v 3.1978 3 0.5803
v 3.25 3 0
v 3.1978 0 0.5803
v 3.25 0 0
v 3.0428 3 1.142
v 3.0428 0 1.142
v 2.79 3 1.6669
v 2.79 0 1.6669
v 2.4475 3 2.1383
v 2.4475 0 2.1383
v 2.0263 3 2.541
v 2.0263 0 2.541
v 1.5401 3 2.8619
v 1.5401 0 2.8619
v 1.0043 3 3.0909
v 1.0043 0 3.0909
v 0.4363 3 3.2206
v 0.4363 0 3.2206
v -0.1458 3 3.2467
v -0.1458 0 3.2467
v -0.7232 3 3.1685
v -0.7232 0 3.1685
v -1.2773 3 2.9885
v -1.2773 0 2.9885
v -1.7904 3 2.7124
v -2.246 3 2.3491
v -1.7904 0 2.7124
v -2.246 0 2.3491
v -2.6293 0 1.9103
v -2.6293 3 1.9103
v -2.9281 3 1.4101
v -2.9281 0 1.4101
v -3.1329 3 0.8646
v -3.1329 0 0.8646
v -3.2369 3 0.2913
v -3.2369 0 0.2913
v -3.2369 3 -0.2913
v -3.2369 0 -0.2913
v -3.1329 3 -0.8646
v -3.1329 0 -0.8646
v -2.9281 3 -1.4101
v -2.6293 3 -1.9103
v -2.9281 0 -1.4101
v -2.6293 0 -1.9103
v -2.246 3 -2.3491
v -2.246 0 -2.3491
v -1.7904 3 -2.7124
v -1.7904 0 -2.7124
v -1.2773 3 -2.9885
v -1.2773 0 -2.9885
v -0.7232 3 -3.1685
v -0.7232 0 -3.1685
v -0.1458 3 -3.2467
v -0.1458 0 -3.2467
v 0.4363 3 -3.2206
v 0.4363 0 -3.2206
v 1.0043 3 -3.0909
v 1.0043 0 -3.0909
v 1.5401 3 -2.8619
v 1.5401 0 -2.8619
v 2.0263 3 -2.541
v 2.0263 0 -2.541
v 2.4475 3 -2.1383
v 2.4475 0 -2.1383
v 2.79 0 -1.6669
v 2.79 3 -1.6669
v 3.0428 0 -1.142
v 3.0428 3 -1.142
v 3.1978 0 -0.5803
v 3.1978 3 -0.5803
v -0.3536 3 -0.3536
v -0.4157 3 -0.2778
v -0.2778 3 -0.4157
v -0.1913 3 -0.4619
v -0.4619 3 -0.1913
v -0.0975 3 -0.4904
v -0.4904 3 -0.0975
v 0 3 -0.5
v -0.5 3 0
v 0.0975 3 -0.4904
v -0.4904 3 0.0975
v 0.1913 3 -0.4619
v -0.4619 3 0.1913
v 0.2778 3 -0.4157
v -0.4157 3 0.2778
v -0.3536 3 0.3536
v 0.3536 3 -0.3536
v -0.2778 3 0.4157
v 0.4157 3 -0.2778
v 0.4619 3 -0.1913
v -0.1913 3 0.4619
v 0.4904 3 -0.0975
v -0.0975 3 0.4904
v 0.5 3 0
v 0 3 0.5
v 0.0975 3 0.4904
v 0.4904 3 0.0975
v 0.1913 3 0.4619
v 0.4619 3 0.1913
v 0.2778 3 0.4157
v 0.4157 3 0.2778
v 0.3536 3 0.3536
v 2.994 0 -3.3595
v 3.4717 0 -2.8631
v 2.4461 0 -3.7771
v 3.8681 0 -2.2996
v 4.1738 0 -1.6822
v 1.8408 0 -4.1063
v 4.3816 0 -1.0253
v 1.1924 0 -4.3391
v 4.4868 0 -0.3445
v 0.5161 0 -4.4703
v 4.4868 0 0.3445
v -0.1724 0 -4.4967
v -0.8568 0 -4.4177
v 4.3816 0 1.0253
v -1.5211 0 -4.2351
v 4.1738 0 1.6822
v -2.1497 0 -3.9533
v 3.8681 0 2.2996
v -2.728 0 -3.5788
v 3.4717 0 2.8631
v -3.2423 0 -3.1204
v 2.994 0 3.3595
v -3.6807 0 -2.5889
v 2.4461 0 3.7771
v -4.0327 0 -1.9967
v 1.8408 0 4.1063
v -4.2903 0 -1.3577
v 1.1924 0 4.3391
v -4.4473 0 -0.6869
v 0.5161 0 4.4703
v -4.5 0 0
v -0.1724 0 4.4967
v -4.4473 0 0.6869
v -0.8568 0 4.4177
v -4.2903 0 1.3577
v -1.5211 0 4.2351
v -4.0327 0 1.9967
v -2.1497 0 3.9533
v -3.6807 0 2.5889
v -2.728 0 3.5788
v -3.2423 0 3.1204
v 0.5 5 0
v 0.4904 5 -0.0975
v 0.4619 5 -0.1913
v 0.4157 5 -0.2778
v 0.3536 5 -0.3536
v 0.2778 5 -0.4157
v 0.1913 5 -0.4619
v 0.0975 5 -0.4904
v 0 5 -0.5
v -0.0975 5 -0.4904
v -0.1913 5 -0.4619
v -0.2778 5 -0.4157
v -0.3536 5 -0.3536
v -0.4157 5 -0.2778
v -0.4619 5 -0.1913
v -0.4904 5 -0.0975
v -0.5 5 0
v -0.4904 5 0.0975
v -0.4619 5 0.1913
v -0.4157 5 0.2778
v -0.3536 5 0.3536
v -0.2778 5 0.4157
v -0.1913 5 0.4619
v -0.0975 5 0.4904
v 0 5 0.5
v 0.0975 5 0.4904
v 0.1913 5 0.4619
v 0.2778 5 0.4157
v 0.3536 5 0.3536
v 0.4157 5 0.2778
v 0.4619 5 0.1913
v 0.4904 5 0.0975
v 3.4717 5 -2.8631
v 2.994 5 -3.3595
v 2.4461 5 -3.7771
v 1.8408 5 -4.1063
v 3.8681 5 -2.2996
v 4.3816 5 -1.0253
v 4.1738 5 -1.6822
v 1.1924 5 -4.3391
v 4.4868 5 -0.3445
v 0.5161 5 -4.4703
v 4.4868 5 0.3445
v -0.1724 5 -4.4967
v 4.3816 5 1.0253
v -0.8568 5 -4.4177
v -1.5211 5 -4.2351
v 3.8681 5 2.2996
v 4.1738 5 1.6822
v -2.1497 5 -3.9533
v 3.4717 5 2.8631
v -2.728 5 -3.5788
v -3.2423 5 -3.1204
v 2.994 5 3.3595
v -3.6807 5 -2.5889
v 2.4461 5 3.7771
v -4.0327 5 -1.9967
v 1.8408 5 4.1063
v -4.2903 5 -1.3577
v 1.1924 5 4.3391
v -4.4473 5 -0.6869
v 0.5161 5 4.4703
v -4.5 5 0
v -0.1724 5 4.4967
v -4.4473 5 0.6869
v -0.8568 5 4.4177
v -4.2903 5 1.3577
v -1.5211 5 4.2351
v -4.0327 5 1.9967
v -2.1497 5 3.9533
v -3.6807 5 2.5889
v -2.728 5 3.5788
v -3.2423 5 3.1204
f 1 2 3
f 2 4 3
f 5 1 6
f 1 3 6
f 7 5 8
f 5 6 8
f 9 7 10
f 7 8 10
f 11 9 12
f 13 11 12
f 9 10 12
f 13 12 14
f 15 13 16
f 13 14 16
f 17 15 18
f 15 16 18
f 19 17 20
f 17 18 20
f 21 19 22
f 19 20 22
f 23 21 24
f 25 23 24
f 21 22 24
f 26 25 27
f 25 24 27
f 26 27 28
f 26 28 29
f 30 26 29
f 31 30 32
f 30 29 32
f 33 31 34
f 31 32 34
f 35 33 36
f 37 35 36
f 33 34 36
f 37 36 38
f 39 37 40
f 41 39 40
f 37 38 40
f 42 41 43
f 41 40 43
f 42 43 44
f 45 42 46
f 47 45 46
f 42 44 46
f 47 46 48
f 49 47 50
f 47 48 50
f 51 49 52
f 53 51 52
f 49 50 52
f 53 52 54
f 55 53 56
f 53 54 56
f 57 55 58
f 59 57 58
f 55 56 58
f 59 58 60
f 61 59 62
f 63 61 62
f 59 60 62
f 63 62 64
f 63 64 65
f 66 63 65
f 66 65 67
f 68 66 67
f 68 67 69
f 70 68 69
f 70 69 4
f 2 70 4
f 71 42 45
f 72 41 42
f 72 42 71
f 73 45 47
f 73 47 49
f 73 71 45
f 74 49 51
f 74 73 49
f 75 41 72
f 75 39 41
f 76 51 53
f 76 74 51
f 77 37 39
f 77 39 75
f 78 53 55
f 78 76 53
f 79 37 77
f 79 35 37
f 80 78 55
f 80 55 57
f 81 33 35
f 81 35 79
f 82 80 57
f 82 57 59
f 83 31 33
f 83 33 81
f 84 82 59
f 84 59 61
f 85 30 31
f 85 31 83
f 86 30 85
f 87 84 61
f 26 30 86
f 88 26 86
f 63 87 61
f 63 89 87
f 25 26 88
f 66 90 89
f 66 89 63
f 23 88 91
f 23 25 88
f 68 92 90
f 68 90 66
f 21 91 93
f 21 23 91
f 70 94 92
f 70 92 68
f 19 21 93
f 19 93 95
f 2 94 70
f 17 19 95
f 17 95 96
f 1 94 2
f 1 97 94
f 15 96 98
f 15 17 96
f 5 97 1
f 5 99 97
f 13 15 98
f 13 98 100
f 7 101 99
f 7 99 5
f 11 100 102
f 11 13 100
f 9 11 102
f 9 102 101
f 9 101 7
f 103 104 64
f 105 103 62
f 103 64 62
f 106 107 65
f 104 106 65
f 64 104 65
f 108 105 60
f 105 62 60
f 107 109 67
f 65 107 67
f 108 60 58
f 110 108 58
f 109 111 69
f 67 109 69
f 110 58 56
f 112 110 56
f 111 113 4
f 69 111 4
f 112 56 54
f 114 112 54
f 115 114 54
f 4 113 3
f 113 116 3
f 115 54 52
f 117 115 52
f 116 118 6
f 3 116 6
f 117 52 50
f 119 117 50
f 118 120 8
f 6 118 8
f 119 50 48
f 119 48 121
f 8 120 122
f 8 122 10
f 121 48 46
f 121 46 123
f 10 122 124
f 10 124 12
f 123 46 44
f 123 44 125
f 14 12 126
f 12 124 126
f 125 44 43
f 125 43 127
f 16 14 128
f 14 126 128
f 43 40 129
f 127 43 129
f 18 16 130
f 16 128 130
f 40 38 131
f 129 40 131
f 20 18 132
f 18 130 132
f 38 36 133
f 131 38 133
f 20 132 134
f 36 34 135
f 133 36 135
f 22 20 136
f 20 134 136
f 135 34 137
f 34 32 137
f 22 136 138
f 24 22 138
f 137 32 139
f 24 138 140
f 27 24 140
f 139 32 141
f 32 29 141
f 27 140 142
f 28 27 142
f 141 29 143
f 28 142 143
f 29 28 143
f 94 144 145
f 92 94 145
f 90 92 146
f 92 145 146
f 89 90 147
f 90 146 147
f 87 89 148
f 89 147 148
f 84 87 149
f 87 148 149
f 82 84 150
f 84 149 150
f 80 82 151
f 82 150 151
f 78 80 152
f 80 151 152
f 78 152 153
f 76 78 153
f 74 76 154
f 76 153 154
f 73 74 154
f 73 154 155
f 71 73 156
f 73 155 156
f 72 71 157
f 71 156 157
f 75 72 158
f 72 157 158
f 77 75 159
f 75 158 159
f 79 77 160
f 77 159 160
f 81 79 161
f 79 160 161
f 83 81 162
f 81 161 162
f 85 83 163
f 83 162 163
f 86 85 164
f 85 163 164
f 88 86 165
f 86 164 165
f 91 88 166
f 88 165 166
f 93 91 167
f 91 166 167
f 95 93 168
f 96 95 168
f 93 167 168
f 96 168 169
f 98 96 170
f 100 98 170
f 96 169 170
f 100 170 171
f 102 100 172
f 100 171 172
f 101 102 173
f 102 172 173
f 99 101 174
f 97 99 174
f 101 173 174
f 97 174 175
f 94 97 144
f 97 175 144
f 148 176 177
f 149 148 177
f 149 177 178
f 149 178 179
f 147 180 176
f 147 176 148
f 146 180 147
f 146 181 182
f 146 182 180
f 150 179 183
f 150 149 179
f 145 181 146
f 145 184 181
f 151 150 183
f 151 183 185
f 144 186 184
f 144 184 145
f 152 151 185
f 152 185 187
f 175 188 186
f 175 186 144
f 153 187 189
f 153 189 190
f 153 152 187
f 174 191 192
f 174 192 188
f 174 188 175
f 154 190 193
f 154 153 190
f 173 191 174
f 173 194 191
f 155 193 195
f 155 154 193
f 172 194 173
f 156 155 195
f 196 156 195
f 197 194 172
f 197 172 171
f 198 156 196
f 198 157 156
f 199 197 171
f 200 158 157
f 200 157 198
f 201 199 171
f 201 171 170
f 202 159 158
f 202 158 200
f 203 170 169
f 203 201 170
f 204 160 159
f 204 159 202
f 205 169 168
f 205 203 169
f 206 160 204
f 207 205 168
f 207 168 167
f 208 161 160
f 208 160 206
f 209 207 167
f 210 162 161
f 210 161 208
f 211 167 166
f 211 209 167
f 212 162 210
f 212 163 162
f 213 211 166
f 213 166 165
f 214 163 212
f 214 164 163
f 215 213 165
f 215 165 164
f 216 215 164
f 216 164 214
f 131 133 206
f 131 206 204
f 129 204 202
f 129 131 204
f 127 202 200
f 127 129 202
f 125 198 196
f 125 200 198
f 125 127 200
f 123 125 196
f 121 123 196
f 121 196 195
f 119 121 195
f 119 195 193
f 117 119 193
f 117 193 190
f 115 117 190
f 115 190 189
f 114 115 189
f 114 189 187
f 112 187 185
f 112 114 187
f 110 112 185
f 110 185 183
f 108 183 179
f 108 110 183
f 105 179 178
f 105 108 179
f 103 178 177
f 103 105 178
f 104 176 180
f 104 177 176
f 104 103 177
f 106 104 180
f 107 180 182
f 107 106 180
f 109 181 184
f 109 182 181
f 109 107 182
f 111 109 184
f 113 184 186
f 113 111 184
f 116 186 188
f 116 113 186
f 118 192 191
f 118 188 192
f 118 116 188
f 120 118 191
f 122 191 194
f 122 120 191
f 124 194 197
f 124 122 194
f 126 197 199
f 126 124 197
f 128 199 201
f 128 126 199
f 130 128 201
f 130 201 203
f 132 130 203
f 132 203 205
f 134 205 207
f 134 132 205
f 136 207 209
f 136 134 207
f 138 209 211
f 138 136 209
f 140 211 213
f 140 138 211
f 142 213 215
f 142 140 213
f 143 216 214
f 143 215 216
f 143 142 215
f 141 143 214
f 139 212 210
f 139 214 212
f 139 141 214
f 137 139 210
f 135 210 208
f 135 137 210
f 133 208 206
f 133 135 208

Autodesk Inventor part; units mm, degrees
ref_plane "YZ Plane" through (0, 0, 0) normal (1, 0, 0) x (0, 1, 0)
ref_plane "XZ Plane" through (0, 0, 0) normal (0, 1, 0) x (-1, 0, 0)
ref_plane "XY Plane" through (0, 0, 0) normal (0, 0, 1) x (1, 0, 0)
sketch "Sketch1" plane through (0, 0, 0) normal (0, 1, 0) x (-1, 0, 0)
  point P0 (0, 0)
sketch "Sketch2" plane through (0, 0, 0) normal (0, 1, 0) x (-1, 0, 0)
  circle A0 centre (0, 0) radius 4.5
  dimension "d0" = 9
extrude "Extrusion1" add sketch "Sketch2" along normal blind 5
sketch "Sketch3" plane through (0, 0, 0) normal (0, -1, 0) x (1, 0, 0)
  circle A0 centre (0, 0) radius 3.25
  dimension "d3" = 6.5
extrude "Extrusion2" cut sketch "Sketch3" against normal blind 3
sketch "Sketch4" plane through (0, 5, 0) normal (0, 1, 0) x (1, 0, 0)
  circle A0 centre (0, 0) radius 0.5
  dimension "d6" = 1
extrude "Extrusion3" cut sketch "Sketch4" along normal blind 3
sketch "Sketch5" plane through (0, 5, 0) normal (0, 1, 0) x (1, 0, 0)
  circle A0 centre (0, 0) radius 0.5
  dimension "d9" = 1
extrude "Extrusion4" cut sketch "Sketch5" along normal blind 3
sketch "Sketch6" plane through (0, 5, 0) normal (0, 1, 0) x (1, 0, 0)
  circle A0 centre (0, 0) radius 0.5
  dimension "d12" = 1
extrude "Extrusion5" cut sketch "Sketch6" against normal blind 3
properties part number "Explo base"
